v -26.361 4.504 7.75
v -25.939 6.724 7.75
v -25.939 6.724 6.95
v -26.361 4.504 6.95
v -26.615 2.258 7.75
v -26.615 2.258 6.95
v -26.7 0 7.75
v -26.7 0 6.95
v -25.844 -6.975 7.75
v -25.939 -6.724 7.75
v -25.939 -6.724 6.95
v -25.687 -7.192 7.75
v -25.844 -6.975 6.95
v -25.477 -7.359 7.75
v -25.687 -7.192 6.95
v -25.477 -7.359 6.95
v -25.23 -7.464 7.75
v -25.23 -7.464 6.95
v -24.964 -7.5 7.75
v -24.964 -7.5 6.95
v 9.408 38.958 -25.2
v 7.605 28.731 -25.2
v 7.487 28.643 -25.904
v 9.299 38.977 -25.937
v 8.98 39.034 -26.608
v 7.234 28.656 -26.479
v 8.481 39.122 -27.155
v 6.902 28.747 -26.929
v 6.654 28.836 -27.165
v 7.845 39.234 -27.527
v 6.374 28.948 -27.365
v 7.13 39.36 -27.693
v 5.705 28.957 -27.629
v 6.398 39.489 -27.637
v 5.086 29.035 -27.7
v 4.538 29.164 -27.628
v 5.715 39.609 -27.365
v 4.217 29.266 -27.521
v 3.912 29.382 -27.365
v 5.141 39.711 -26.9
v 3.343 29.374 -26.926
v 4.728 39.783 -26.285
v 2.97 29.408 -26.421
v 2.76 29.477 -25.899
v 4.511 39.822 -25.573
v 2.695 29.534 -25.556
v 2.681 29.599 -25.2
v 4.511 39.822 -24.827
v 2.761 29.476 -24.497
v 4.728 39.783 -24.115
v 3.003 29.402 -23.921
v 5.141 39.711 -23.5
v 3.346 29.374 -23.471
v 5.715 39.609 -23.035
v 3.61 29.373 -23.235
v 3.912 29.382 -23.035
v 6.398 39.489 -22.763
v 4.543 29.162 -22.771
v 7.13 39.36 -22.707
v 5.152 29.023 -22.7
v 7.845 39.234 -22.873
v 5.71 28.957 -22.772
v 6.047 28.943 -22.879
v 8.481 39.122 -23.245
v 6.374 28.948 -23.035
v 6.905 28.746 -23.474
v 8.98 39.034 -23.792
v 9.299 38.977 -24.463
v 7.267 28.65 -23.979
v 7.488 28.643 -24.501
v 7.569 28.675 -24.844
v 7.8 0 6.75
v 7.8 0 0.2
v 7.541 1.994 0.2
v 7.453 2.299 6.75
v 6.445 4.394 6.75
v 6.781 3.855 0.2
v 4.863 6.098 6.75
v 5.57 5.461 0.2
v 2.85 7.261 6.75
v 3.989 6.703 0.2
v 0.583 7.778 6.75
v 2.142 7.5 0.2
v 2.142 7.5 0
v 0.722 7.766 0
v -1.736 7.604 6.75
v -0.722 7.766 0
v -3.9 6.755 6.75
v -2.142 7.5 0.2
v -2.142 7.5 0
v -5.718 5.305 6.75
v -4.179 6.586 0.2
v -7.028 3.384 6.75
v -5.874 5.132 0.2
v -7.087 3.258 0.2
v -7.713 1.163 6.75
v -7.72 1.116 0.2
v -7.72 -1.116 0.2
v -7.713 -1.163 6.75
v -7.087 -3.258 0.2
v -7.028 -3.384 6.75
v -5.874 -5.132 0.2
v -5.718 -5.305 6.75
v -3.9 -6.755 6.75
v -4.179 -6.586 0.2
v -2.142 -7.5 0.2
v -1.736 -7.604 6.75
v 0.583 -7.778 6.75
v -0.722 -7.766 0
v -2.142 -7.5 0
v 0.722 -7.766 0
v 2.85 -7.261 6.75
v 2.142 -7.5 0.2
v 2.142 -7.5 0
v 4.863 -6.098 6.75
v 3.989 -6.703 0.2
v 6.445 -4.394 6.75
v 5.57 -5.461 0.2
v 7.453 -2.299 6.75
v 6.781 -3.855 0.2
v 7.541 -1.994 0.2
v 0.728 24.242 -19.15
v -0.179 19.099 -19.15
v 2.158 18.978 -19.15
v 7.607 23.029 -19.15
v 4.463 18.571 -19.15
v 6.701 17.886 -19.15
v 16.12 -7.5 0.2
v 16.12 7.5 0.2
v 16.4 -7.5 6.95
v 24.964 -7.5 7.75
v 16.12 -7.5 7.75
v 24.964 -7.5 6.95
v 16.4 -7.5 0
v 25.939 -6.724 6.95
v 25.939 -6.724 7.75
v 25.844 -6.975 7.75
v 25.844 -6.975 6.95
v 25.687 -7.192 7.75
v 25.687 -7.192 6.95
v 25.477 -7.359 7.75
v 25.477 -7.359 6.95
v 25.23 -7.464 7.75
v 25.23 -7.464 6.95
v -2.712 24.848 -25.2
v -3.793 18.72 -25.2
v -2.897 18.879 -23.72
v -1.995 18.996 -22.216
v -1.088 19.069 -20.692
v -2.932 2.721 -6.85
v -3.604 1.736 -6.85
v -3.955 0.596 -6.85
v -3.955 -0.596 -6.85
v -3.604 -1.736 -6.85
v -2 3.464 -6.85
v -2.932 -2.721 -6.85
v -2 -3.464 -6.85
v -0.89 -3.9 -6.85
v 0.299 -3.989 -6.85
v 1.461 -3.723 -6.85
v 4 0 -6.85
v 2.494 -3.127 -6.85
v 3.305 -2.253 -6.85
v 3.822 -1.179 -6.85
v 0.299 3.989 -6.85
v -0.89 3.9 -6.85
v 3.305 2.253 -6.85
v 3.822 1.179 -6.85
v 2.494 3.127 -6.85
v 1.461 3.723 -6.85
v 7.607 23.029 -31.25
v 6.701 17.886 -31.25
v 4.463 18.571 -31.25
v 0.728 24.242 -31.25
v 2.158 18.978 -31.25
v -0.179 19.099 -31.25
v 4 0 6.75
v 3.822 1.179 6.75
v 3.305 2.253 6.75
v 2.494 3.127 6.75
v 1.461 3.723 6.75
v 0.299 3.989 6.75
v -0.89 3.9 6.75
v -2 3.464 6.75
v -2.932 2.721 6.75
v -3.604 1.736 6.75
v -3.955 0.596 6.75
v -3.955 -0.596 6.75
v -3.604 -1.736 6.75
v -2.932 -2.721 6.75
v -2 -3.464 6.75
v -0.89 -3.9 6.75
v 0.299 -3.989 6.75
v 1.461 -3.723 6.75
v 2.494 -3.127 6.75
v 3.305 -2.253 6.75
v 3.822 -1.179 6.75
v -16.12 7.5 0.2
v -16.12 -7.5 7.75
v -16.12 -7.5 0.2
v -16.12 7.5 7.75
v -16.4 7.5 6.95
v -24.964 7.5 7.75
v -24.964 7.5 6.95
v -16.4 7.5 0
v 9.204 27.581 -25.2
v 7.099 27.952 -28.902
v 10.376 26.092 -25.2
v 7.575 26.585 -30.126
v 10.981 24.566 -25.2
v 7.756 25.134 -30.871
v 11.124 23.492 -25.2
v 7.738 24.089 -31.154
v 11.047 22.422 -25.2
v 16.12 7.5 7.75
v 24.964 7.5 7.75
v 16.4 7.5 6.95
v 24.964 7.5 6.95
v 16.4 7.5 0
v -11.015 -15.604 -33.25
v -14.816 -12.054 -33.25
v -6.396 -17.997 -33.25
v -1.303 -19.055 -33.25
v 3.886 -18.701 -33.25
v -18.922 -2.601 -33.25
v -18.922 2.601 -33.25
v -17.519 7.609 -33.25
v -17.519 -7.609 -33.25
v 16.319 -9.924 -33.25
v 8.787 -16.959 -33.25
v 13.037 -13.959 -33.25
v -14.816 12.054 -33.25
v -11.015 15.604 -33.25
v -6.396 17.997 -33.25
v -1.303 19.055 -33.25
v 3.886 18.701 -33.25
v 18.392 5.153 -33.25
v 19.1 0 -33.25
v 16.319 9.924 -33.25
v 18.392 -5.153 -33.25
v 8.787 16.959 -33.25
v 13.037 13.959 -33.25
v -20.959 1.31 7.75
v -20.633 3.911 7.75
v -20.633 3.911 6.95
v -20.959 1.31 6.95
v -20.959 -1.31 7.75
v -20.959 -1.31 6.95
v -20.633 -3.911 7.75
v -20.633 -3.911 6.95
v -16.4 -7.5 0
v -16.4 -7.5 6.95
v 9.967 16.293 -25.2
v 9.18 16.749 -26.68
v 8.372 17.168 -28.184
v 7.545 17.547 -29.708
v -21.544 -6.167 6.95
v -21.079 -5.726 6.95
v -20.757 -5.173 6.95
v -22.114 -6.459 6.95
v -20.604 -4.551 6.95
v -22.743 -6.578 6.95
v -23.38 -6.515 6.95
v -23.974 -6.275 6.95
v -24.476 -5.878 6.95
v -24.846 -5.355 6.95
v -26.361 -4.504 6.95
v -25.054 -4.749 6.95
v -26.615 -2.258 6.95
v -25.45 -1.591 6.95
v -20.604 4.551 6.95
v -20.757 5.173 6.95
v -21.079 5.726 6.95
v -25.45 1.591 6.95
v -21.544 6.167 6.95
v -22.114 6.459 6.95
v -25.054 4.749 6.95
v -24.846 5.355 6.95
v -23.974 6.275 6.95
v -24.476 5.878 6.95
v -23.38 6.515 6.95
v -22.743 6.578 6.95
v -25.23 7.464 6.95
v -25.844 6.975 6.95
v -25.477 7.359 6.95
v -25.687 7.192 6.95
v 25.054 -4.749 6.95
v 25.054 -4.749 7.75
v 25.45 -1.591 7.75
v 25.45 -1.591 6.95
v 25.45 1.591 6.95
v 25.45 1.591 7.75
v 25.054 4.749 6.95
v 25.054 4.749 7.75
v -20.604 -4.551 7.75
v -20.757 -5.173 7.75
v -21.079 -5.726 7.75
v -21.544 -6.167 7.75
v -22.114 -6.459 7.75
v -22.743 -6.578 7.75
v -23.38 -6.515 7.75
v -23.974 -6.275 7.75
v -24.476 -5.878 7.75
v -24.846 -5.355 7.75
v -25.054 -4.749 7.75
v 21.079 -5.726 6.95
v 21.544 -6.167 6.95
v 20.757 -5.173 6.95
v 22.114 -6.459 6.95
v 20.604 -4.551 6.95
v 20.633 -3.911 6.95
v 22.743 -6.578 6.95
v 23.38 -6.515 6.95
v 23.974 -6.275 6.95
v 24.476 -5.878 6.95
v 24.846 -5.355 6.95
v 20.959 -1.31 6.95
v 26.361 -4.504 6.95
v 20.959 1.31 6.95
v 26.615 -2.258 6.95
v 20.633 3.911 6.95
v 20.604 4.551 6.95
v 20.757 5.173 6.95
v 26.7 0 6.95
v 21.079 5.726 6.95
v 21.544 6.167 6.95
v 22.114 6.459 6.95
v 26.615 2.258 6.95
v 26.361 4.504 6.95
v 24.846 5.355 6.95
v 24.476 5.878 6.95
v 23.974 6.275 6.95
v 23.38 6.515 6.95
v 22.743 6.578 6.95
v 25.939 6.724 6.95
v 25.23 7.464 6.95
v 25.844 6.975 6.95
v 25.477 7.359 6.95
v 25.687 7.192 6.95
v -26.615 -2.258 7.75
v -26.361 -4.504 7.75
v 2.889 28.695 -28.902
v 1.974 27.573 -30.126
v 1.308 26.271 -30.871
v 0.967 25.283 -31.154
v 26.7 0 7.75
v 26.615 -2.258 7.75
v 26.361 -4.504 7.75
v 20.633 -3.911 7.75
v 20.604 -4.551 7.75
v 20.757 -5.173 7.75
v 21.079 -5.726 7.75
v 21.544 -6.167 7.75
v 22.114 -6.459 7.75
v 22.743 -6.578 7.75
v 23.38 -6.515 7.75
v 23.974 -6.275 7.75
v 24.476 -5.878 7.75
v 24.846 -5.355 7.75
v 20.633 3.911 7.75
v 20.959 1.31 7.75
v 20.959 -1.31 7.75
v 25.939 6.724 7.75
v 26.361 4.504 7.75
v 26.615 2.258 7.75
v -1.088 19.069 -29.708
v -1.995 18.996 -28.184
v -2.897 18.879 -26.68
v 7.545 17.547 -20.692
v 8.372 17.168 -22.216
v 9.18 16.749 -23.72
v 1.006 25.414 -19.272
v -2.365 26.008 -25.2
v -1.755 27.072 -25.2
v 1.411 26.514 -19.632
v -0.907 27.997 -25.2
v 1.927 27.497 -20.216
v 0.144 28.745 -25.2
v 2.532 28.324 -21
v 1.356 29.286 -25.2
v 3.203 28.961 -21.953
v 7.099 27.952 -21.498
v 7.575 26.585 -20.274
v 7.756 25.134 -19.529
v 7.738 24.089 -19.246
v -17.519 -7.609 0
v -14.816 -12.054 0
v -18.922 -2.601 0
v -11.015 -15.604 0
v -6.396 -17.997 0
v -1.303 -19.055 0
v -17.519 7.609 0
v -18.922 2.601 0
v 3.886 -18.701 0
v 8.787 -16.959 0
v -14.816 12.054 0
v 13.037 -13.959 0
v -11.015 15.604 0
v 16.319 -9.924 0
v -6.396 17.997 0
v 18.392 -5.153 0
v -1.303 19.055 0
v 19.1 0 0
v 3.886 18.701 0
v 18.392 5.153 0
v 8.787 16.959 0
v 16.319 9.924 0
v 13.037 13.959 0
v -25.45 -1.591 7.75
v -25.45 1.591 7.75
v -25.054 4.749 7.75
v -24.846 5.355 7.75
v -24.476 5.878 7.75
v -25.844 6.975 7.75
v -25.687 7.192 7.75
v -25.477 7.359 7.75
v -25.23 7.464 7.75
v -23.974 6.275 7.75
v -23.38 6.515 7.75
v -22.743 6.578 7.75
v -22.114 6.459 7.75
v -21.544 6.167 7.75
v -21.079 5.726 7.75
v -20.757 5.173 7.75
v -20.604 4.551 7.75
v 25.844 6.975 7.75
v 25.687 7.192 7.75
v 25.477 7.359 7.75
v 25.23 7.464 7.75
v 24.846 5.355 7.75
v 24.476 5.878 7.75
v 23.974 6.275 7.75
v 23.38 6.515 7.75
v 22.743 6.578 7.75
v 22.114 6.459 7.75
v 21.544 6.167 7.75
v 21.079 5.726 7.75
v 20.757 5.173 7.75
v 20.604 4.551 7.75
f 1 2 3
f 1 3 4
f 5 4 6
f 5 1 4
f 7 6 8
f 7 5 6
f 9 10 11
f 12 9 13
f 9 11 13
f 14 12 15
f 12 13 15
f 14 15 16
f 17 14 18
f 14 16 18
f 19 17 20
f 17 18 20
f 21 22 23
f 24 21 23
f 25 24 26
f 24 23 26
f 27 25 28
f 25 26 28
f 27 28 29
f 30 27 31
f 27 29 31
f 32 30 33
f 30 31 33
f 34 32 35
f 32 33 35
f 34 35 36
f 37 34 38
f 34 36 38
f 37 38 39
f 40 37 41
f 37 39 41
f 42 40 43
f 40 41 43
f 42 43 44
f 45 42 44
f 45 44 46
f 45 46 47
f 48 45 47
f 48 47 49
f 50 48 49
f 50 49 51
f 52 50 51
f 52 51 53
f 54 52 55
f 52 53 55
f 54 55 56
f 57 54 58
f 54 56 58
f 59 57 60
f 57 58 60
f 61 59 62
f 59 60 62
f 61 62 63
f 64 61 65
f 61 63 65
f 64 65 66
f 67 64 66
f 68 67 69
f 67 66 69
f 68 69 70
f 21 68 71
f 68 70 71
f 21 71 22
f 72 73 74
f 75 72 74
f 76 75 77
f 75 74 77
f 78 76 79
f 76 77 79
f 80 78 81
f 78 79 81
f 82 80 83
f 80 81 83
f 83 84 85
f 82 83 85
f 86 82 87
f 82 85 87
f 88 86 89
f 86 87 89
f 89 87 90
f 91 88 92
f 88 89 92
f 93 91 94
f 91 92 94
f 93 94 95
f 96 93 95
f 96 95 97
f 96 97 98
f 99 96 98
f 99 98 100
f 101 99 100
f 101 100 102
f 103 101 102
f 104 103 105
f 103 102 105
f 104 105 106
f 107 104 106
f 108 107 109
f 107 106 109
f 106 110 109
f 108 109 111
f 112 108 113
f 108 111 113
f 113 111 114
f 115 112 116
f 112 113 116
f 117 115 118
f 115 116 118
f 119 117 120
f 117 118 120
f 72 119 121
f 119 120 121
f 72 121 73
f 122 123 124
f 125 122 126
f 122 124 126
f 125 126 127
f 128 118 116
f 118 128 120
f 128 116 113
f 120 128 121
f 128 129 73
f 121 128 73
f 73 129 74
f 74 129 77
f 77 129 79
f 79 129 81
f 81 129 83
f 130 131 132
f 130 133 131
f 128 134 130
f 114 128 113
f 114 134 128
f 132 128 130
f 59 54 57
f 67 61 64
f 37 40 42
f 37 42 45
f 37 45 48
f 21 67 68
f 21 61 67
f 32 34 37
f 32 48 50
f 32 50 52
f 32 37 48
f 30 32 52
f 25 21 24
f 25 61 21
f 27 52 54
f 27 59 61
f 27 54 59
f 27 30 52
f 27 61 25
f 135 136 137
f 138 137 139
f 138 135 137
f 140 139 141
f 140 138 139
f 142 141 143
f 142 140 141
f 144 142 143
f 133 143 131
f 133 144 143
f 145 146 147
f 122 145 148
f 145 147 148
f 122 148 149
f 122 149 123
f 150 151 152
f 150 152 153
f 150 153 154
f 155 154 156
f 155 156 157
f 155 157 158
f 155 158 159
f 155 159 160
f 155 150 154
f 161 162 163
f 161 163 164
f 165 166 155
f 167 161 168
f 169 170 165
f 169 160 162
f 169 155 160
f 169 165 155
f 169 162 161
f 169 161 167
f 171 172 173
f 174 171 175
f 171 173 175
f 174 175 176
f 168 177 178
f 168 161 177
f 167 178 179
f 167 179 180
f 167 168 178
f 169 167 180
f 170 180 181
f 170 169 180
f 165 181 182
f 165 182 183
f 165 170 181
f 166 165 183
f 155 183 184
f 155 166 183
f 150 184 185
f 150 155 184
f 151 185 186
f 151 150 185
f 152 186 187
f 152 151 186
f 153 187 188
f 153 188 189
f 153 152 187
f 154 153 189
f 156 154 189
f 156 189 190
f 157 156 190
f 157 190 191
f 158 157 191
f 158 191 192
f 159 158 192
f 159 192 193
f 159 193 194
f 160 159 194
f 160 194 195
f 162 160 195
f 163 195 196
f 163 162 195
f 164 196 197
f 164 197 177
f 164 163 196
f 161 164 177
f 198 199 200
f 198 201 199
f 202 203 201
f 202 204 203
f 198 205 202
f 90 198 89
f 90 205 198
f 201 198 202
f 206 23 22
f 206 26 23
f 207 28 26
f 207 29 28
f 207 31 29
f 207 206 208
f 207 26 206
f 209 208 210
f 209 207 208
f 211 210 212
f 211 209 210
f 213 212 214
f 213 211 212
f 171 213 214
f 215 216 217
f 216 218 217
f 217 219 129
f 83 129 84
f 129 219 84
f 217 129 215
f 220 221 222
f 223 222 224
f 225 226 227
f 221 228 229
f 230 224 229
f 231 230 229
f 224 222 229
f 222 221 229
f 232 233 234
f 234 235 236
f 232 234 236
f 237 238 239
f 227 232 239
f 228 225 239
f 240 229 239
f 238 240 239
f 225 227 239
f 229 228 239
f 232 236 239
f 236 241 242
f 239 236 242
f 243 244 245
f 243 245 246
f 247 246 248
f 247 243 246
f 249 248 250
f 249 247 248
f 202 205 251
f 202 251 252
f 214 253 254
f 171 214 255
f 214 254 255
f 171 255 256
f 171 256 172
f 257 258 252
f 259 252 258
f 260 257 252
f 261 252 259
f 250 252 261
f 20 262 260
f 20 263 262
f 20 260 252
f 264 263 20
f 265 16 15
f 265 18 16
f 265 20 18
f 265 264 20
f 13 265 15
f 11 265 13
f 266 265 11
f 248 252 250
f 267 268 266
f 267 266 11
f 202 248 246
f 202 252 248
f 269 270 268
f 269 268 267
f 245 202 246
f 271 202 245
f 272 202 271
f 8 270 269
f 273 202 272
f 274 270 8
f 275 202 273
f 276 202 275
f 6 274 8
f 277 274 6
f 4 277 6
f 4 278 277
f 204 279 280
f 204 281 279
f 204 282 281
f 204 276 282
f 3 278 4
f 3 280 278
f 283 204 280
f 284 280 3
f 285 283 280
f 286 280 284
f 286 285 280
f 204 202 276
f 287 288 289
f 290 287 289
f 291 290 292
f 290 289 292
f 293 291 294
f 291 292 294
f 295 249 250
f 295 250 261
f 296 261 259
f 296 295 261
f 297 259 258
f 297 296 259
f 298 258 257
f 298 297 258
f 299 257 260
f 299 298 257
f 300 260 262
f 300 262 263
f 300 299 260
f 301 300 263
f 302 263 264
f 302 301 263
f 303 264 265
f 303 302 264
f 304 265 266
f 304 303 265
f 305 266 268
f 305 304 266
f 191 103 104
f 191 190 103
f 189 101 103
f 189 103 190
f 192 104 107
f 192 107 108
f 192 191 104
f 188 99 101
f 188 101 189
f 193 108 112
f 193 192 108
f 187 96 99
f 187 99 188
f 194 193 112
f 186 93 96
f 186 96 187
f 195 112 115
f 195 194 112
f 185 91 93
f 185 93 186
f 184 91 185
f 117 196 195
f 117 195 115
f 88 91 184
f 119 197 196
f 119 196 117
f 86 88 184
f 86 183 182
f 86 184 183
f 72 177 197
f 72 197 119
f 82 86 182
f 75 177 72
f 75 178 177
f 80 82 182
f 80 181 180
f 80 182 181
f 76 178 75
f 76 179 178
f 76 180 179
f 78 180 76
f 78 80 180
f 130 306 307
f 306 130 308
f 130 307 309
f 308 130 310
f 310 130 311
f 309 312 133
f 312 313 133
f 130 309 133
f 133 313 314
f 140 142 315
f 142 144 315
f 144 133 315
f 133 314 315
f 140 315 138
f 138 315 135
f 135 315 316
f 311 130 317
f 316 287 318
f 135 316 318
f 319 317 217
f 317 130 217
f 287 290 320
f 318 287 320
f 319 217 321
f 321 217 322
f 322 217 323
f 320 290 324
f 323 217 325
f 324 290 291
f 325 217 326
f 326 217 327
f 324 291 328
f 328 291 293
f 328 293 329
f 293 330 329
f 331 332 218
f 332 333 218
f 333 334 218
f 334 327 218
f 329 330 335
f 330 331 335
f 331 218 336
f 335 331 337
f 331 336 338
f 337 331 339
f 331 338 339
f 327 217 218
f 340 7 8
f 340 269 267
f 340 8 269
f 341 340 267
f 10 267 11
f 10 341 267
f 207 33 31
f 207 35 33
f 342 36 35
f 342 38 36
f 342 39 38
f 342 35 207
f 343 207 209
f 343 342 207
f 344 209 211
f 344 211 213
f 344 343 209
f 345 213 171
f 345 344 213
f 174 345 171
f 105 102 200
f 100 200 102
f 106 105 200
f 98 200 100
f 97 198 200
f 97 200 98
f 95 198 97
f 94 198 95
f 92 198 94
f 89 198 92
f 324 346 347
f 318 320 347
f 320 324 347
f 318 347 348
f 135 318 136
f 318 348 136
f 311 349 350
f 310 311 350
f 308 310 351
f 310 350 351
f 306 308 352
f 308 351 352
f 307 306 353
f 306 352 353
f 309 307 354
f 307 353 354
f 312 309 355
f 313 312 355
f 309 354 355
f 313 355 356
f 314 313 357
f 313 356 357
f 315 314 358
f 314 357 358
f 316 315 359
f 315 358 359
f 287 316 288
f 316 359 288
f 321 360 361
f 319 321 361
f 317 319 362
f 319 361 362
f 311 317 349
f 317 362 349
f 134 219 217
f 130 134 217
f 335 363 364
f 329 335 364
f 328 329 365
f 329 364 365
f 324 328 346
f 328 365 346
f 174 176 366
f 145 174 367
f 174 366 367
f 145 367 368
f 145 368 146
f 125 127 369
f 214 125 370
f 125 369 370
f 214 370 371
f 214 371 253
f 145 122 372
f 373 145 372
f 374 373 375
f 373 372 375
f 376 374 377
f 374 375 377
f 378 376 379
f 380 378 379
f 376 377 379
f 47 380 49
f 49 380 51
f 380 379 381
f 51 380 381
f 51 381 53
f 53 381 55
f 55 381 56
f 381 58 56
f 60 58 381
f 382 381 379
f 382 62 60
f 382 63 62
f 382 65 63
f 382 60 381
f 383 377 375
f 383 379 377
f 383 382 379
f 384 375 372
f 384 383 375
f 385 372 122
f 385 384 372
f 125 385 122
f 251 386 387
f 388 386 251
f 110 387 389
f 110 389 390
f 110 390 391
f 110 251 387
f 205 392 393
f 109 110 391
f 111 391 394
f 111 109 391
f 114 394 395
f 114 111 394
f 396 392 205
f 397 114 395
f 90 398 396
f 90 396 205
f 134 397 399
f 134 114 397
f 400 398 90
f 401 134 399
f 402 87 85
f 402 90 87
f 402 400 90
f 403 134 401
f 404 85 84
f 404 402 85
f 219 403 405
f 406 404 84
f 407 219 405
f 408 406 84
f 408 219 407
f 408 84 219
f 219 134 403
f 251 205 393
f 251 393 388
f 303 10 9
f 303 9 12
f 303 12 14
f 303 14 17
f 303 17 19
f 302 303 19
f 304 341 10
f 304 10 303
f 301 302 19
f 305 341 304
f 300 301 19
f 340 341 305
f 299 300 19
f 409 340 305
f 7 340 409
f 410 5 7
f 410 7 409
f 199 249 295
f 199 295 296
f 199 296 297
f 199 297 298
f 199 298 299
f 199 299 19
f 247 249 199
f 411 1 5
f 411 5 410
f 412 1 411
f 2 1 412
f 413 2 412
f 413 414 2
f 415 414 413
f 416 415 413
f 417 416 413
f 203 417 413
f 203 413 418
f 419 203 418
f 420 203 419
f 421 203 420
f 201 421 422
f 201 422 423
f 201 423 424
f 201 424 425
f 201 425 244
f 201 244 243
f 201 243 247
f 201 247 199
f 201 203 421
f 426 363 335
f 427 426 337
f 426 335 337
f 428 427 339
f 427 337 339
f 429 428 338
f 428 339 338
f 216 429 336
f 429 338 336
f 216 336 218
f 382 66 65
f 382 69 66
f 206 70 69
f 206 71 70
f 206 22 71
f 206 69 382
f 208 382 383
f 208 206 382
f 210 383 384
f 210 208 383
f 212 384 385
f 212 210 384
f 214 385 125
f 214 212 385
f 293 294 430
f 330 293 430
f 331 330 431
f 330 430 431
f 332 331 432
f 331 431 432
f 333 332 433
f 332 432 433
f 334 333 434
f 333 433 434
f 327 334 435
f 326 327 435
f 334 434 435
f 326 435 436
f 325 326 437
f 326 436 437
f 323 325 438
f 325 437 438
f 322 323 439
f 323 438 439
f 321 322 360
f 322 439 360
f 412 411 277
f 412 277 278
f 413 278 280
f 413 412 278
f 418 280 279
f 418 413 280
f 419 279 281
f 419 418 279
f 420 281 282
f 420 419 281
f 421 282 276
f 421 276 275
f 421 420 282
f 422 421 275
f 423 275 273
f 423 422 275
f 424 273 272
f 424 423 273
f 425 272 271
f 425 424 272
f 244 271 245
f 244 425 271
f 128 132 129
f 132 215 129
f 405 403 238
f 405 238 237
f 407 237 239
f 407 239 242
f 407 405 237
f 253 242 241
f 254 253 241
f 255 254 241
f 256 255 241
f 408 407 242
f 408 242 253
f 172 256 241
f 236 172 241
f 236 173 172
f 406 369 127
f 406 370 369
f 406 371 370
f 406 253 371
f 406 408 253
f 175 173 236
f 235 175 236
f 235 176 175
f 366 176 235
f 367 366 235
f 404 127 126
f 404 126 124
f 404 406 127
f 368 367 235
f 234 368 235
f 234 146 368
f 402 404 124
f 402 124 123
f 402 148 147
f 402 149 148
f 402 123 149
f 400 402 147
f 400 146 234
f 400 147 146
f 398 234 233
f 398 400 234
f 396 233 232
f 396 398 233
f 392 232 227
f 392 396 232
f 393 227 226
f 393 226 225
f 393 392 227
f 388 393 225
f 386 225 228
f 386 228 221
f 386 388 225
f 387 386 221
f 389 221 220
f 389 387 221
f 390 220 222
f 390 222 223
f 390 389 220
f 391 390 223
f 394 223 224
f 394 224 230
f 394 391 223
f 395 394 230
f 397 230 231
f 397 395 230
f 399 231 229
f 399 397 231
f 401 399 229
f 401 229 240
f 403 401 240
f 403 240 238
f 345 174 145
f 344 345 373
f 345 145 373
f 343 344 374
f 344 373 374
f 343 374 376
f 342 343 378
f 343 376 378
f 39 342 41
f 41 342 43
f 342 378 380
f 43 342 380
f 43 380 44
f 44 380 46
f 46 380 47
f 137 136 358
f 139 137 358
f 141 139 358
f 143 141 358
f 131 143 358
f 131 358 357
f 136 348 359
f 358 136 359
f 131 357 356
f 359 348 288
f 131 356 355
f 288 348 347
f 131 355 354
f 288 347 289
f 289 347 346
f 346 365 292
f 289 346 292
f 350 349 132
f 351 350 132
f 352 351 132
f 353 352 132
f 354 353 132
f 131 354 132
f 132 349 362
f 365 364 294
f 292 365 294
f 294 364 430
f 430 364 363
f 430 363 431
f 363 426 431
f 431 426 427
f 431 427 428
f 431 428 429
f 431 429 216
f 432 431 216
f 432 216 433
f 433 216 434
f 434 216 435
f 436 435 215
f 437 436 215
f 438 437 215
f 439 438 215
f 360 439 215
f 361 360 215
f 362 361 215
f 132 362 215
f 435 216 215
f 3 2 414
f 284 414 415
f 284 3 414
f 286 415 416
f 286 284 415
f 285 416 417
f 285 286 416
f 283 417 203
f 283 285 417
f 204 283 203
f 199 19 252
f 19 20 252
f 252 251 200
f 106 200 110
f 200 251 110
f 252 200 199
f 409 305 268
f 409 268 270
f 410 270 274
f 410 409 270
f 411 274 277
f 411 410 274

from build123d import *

# Parameters (mm, degrees)
SKETCH1_R            = 19.1
BOSS_EXTRUDE1_DEPTH  = 33.25
SKETCH2_R            = 7.8
SKETCH2_R_2          = 4
BOSS_EXTRUDE2_DEPTH  = 6.75
BOSS_EXTRUDE4_DEPTH  = 7.5
CUT_EXTRUDE1_REACH   = 54.523
FILLET1_R            = 1
FILLET1_OF_MIRROR2_R = 1
CUT_EXTRUDE2_START   = -6.85
SKETCH2_3_R          = 4
CUT_EXTRUDE2_DEPTH   = 13.6
BOSS_EXTRUDE5_DEPTH  = 30
FILLET2_R            = 6
SKETCH6_R            = 2.5
BOSS_EXTRUDE6_DEPTH  = 40


with BuildPart() as part:
    # Sketch1 → Boss-Extrude1 (new body)
    with BuildSketch(Plane.XY):
        Circle(SKETCH1_R)
    extrude(amount=-BOSS_EXTRUDE1_DEPTH)

    # Sketch2 → Boss-Extrude2 (add)
    with BuildSketch(Plane.XY):
        Circle(SKETCH2_R)
        Circle(SKETCH2_R_2, mode=Mode.SUBTRACT)
    extrude(amount=BOSS_EXTRUDE2_DEPTH)

    # Sketch3 → Boss-Extrude4 (add, symmetric)
    with BuildSketch(Plane(origin=(0, 0, 0), x_dir=(1, 0, 0), z_dir=(0, 1, 0))):
        Polygon((26.7, -6.95), (26.7, -7.75), (16.12, -7.75), (16.12, -0.2), (0, -0.2), (0, 0), (16.4, 0), (16.4, -6.95), align=None)
    boss_extrude4 = extrude(amount=BOSS_EXTRUDE4_DEPTH, both=True)

    # Sketch4 → Cut-Extrude1 (cut, up to next)
    with BuildSketch(Plane.XY.offset(7.75), mode=Mode.PRIVATE) as cut_extrude1_sk1:
        with BuildLine():
            ThreePointArc((25.0538758, -4.749032258), (25.5, 0), (25.0538758, 4.749032258))
            ThreePointArc((25.0538758, 4.749032258), (22.424207442, 6.5406361), (20.6326036, 3.910967742))
            ThreePointArc((20.6326036, 3.910967742), (21, 0), (20.6326036, -3.910967742))
            ThreePointArc((20.6326036, -3.910967742), (22.424207442, -6.5406361), (25.0538758, -4.749032258))
        make_face()
    cut_extrude1_tool1 = extrude(cut_extrude1_sk1.sketch, amount=-CUT_EXTRUDE1_REACH, mode=Mode.PRIVATE) & part.part
    # Sketch4 → Cut-Extrude1 (cut, up to next)
    with BuildSketch(Plane.XY.offset(7.75), mode=Mode.PRIVATE) as cut_extrude1_sk2:
        with BuildLine():
            ThreePointArc((26.7, -1.8e-08), (26.461554926, -3.779963633), (25.75, -7.5))
            Line((25.75, -7.5), (26.7, -7.5))
            Line((26.7, -7.5), (26.7, -1.8e-08))
        make_face()
    cut_extrude1_tool2 = extrude(cut_extrude1_sk2.sketch, amount=-CUT_EXTRUDE1_REACH, mode=Mode.PRIVATE) & part.part
    # Sketch4 → Cut-Extrude1 (cut, up to next)
    with BuildSketch(Plane.XY.offset(7.75), mode=Mode.PRIVATE) as cut_extrude1_sk3:
        with BuildLine():
            ThreePointArc((25.75, 7.5), (26.461554929, 3.779963615), (26.7, -1.8e-08))
            Line((26.7, -1.8e-08), (26.7, 7.5))
            Line((26.7, 7.5), (25.75, 7.5))
        make_face()
    cut_extrude1_tool3 = extrude(cut_extrude1_sk3.sketch, amount=-CUT_EXTRUDE1_REACH, mode=Mode.PRIVATE) & part.part
    cut_extrude1_1 = cut_extrude1_tool1.solids().sort_by_distance((23.036032, 0, 7.75))[0]
    add(cut_extrude1_1, mode=Mode.SUBTRACT)
    cut_extrude1_2 = cut_extrude1_tool2.solids().sort_by_distance((26.415788, -5.630973, 7.75))[0]
    add(cut_extrude1_2, mode=Mode.SUBTRACT)
    cut_extrude1_3 = cut_extrude1_tool3.solids().sort_by_distance((26.415788, 5.630973, 7.75))[0]
    add(cut_extrude1_3, mode=Mode.SUBTRACT)
    cut_extrude1 = cut_extrude1_1 + cut_extrude1_2 + cut_extrude1_3  # Cut-Extrude1 as one shape, for the pattern or mirror that repeats it

    # Fillet1
    fillet1_edges = [part.edges().sort_by_distance(p)[0] for p in [
        (25.75, -7.5, 7.35),
        (25.75, 7.5, 7.35),
    ]]
    fillet(fillet1_edges, radius=FILLET1_R)

    # Mirror2: Boss-Extrude4, Cut-Extrude1 across plane
    add(boss_extrude4.mirror(Plane(origin=(0, 0, 0), x_dir=(0, 0, 1), z_dir=(1, 0, 0))))
    add(cut_extrude1.mirror(Plane(origin=(0, 0, 0), x_dir=(0, 0, 1), z_dir=(1, 0, 0))), mode=Mode.SUBTRACT)

    # Fillet1 of Mirror2
    fillet1_of_mirror2_edges = [part.edges().sort_by_distance(p)[0] for p in [
        (-25.75, -7.5, 7.35),
        (-25.75, 7.5, 7.35),
    ]]
    fillet(fillet1_of_mirror2_edges, radius=FILLET1_OF_MIRROR2_R)

    # Sketch2<3> → Cut-Extrude2 (cut)
    with BuildSketch(Plane.XY.offset(CUT_EXTRUDE2_START)):
        Circle(SKETCH2_3_R)
    extrude(amount=CUT_EXTRUDE2_DEPTH, mode=Mode.SUBTRACT)

    # Sketch5 → Boss-Extrude5 (add)
    with BuildSketch(Plane(origin=(0, 0, 0), x_dir=(0, 0, 1), z_dir=(0.17364817766693072, 0.984807753012208, 0))):
        Polygon((-31.25, -3.492969129), (-25.2, -6.985938257), (-19.15, -3.492969129), (-19.15, 3.492969129), (-25.2, 6.985938257), (-31.25, 3.492969129), align=None)
    extrude(amount=BOSS_EXTRUDE5_DEPTH)

    # Fillet2
    fillet2_edges = [part.edges().sort_by_distance(p)[0] for p in [
        (5.20944533, 29.54423259, -31.25),
        (0.049590712, 30.454054176, -28.225),
        (0.049590712, 30.454054176, -22.175),
        (5.20944533, 29.54423259, -19.15),
        (10.369299948, 28.634411005, -22.175),
        (10.369299948, 28.634411005, -28.225),
    ]]
    fillet(fillet2_edges, radius=FILLET2_R)

    # Sketch6 → Boss-Extrude6 (add)
    with BuildSketch(Plane(origin=(0, 0, 0), x_dir=(0, 0, 1), z_dir=(0.17364817766693072, 0.984807753012208, 0))):
        with Locations(Location((-25.2, 0, 0), (0, 0, 90))):
            Circle(SKETCH6_R)
    extrude(amount=BOSS_EXTRUDE6_DEPTH)


solid = part.part
